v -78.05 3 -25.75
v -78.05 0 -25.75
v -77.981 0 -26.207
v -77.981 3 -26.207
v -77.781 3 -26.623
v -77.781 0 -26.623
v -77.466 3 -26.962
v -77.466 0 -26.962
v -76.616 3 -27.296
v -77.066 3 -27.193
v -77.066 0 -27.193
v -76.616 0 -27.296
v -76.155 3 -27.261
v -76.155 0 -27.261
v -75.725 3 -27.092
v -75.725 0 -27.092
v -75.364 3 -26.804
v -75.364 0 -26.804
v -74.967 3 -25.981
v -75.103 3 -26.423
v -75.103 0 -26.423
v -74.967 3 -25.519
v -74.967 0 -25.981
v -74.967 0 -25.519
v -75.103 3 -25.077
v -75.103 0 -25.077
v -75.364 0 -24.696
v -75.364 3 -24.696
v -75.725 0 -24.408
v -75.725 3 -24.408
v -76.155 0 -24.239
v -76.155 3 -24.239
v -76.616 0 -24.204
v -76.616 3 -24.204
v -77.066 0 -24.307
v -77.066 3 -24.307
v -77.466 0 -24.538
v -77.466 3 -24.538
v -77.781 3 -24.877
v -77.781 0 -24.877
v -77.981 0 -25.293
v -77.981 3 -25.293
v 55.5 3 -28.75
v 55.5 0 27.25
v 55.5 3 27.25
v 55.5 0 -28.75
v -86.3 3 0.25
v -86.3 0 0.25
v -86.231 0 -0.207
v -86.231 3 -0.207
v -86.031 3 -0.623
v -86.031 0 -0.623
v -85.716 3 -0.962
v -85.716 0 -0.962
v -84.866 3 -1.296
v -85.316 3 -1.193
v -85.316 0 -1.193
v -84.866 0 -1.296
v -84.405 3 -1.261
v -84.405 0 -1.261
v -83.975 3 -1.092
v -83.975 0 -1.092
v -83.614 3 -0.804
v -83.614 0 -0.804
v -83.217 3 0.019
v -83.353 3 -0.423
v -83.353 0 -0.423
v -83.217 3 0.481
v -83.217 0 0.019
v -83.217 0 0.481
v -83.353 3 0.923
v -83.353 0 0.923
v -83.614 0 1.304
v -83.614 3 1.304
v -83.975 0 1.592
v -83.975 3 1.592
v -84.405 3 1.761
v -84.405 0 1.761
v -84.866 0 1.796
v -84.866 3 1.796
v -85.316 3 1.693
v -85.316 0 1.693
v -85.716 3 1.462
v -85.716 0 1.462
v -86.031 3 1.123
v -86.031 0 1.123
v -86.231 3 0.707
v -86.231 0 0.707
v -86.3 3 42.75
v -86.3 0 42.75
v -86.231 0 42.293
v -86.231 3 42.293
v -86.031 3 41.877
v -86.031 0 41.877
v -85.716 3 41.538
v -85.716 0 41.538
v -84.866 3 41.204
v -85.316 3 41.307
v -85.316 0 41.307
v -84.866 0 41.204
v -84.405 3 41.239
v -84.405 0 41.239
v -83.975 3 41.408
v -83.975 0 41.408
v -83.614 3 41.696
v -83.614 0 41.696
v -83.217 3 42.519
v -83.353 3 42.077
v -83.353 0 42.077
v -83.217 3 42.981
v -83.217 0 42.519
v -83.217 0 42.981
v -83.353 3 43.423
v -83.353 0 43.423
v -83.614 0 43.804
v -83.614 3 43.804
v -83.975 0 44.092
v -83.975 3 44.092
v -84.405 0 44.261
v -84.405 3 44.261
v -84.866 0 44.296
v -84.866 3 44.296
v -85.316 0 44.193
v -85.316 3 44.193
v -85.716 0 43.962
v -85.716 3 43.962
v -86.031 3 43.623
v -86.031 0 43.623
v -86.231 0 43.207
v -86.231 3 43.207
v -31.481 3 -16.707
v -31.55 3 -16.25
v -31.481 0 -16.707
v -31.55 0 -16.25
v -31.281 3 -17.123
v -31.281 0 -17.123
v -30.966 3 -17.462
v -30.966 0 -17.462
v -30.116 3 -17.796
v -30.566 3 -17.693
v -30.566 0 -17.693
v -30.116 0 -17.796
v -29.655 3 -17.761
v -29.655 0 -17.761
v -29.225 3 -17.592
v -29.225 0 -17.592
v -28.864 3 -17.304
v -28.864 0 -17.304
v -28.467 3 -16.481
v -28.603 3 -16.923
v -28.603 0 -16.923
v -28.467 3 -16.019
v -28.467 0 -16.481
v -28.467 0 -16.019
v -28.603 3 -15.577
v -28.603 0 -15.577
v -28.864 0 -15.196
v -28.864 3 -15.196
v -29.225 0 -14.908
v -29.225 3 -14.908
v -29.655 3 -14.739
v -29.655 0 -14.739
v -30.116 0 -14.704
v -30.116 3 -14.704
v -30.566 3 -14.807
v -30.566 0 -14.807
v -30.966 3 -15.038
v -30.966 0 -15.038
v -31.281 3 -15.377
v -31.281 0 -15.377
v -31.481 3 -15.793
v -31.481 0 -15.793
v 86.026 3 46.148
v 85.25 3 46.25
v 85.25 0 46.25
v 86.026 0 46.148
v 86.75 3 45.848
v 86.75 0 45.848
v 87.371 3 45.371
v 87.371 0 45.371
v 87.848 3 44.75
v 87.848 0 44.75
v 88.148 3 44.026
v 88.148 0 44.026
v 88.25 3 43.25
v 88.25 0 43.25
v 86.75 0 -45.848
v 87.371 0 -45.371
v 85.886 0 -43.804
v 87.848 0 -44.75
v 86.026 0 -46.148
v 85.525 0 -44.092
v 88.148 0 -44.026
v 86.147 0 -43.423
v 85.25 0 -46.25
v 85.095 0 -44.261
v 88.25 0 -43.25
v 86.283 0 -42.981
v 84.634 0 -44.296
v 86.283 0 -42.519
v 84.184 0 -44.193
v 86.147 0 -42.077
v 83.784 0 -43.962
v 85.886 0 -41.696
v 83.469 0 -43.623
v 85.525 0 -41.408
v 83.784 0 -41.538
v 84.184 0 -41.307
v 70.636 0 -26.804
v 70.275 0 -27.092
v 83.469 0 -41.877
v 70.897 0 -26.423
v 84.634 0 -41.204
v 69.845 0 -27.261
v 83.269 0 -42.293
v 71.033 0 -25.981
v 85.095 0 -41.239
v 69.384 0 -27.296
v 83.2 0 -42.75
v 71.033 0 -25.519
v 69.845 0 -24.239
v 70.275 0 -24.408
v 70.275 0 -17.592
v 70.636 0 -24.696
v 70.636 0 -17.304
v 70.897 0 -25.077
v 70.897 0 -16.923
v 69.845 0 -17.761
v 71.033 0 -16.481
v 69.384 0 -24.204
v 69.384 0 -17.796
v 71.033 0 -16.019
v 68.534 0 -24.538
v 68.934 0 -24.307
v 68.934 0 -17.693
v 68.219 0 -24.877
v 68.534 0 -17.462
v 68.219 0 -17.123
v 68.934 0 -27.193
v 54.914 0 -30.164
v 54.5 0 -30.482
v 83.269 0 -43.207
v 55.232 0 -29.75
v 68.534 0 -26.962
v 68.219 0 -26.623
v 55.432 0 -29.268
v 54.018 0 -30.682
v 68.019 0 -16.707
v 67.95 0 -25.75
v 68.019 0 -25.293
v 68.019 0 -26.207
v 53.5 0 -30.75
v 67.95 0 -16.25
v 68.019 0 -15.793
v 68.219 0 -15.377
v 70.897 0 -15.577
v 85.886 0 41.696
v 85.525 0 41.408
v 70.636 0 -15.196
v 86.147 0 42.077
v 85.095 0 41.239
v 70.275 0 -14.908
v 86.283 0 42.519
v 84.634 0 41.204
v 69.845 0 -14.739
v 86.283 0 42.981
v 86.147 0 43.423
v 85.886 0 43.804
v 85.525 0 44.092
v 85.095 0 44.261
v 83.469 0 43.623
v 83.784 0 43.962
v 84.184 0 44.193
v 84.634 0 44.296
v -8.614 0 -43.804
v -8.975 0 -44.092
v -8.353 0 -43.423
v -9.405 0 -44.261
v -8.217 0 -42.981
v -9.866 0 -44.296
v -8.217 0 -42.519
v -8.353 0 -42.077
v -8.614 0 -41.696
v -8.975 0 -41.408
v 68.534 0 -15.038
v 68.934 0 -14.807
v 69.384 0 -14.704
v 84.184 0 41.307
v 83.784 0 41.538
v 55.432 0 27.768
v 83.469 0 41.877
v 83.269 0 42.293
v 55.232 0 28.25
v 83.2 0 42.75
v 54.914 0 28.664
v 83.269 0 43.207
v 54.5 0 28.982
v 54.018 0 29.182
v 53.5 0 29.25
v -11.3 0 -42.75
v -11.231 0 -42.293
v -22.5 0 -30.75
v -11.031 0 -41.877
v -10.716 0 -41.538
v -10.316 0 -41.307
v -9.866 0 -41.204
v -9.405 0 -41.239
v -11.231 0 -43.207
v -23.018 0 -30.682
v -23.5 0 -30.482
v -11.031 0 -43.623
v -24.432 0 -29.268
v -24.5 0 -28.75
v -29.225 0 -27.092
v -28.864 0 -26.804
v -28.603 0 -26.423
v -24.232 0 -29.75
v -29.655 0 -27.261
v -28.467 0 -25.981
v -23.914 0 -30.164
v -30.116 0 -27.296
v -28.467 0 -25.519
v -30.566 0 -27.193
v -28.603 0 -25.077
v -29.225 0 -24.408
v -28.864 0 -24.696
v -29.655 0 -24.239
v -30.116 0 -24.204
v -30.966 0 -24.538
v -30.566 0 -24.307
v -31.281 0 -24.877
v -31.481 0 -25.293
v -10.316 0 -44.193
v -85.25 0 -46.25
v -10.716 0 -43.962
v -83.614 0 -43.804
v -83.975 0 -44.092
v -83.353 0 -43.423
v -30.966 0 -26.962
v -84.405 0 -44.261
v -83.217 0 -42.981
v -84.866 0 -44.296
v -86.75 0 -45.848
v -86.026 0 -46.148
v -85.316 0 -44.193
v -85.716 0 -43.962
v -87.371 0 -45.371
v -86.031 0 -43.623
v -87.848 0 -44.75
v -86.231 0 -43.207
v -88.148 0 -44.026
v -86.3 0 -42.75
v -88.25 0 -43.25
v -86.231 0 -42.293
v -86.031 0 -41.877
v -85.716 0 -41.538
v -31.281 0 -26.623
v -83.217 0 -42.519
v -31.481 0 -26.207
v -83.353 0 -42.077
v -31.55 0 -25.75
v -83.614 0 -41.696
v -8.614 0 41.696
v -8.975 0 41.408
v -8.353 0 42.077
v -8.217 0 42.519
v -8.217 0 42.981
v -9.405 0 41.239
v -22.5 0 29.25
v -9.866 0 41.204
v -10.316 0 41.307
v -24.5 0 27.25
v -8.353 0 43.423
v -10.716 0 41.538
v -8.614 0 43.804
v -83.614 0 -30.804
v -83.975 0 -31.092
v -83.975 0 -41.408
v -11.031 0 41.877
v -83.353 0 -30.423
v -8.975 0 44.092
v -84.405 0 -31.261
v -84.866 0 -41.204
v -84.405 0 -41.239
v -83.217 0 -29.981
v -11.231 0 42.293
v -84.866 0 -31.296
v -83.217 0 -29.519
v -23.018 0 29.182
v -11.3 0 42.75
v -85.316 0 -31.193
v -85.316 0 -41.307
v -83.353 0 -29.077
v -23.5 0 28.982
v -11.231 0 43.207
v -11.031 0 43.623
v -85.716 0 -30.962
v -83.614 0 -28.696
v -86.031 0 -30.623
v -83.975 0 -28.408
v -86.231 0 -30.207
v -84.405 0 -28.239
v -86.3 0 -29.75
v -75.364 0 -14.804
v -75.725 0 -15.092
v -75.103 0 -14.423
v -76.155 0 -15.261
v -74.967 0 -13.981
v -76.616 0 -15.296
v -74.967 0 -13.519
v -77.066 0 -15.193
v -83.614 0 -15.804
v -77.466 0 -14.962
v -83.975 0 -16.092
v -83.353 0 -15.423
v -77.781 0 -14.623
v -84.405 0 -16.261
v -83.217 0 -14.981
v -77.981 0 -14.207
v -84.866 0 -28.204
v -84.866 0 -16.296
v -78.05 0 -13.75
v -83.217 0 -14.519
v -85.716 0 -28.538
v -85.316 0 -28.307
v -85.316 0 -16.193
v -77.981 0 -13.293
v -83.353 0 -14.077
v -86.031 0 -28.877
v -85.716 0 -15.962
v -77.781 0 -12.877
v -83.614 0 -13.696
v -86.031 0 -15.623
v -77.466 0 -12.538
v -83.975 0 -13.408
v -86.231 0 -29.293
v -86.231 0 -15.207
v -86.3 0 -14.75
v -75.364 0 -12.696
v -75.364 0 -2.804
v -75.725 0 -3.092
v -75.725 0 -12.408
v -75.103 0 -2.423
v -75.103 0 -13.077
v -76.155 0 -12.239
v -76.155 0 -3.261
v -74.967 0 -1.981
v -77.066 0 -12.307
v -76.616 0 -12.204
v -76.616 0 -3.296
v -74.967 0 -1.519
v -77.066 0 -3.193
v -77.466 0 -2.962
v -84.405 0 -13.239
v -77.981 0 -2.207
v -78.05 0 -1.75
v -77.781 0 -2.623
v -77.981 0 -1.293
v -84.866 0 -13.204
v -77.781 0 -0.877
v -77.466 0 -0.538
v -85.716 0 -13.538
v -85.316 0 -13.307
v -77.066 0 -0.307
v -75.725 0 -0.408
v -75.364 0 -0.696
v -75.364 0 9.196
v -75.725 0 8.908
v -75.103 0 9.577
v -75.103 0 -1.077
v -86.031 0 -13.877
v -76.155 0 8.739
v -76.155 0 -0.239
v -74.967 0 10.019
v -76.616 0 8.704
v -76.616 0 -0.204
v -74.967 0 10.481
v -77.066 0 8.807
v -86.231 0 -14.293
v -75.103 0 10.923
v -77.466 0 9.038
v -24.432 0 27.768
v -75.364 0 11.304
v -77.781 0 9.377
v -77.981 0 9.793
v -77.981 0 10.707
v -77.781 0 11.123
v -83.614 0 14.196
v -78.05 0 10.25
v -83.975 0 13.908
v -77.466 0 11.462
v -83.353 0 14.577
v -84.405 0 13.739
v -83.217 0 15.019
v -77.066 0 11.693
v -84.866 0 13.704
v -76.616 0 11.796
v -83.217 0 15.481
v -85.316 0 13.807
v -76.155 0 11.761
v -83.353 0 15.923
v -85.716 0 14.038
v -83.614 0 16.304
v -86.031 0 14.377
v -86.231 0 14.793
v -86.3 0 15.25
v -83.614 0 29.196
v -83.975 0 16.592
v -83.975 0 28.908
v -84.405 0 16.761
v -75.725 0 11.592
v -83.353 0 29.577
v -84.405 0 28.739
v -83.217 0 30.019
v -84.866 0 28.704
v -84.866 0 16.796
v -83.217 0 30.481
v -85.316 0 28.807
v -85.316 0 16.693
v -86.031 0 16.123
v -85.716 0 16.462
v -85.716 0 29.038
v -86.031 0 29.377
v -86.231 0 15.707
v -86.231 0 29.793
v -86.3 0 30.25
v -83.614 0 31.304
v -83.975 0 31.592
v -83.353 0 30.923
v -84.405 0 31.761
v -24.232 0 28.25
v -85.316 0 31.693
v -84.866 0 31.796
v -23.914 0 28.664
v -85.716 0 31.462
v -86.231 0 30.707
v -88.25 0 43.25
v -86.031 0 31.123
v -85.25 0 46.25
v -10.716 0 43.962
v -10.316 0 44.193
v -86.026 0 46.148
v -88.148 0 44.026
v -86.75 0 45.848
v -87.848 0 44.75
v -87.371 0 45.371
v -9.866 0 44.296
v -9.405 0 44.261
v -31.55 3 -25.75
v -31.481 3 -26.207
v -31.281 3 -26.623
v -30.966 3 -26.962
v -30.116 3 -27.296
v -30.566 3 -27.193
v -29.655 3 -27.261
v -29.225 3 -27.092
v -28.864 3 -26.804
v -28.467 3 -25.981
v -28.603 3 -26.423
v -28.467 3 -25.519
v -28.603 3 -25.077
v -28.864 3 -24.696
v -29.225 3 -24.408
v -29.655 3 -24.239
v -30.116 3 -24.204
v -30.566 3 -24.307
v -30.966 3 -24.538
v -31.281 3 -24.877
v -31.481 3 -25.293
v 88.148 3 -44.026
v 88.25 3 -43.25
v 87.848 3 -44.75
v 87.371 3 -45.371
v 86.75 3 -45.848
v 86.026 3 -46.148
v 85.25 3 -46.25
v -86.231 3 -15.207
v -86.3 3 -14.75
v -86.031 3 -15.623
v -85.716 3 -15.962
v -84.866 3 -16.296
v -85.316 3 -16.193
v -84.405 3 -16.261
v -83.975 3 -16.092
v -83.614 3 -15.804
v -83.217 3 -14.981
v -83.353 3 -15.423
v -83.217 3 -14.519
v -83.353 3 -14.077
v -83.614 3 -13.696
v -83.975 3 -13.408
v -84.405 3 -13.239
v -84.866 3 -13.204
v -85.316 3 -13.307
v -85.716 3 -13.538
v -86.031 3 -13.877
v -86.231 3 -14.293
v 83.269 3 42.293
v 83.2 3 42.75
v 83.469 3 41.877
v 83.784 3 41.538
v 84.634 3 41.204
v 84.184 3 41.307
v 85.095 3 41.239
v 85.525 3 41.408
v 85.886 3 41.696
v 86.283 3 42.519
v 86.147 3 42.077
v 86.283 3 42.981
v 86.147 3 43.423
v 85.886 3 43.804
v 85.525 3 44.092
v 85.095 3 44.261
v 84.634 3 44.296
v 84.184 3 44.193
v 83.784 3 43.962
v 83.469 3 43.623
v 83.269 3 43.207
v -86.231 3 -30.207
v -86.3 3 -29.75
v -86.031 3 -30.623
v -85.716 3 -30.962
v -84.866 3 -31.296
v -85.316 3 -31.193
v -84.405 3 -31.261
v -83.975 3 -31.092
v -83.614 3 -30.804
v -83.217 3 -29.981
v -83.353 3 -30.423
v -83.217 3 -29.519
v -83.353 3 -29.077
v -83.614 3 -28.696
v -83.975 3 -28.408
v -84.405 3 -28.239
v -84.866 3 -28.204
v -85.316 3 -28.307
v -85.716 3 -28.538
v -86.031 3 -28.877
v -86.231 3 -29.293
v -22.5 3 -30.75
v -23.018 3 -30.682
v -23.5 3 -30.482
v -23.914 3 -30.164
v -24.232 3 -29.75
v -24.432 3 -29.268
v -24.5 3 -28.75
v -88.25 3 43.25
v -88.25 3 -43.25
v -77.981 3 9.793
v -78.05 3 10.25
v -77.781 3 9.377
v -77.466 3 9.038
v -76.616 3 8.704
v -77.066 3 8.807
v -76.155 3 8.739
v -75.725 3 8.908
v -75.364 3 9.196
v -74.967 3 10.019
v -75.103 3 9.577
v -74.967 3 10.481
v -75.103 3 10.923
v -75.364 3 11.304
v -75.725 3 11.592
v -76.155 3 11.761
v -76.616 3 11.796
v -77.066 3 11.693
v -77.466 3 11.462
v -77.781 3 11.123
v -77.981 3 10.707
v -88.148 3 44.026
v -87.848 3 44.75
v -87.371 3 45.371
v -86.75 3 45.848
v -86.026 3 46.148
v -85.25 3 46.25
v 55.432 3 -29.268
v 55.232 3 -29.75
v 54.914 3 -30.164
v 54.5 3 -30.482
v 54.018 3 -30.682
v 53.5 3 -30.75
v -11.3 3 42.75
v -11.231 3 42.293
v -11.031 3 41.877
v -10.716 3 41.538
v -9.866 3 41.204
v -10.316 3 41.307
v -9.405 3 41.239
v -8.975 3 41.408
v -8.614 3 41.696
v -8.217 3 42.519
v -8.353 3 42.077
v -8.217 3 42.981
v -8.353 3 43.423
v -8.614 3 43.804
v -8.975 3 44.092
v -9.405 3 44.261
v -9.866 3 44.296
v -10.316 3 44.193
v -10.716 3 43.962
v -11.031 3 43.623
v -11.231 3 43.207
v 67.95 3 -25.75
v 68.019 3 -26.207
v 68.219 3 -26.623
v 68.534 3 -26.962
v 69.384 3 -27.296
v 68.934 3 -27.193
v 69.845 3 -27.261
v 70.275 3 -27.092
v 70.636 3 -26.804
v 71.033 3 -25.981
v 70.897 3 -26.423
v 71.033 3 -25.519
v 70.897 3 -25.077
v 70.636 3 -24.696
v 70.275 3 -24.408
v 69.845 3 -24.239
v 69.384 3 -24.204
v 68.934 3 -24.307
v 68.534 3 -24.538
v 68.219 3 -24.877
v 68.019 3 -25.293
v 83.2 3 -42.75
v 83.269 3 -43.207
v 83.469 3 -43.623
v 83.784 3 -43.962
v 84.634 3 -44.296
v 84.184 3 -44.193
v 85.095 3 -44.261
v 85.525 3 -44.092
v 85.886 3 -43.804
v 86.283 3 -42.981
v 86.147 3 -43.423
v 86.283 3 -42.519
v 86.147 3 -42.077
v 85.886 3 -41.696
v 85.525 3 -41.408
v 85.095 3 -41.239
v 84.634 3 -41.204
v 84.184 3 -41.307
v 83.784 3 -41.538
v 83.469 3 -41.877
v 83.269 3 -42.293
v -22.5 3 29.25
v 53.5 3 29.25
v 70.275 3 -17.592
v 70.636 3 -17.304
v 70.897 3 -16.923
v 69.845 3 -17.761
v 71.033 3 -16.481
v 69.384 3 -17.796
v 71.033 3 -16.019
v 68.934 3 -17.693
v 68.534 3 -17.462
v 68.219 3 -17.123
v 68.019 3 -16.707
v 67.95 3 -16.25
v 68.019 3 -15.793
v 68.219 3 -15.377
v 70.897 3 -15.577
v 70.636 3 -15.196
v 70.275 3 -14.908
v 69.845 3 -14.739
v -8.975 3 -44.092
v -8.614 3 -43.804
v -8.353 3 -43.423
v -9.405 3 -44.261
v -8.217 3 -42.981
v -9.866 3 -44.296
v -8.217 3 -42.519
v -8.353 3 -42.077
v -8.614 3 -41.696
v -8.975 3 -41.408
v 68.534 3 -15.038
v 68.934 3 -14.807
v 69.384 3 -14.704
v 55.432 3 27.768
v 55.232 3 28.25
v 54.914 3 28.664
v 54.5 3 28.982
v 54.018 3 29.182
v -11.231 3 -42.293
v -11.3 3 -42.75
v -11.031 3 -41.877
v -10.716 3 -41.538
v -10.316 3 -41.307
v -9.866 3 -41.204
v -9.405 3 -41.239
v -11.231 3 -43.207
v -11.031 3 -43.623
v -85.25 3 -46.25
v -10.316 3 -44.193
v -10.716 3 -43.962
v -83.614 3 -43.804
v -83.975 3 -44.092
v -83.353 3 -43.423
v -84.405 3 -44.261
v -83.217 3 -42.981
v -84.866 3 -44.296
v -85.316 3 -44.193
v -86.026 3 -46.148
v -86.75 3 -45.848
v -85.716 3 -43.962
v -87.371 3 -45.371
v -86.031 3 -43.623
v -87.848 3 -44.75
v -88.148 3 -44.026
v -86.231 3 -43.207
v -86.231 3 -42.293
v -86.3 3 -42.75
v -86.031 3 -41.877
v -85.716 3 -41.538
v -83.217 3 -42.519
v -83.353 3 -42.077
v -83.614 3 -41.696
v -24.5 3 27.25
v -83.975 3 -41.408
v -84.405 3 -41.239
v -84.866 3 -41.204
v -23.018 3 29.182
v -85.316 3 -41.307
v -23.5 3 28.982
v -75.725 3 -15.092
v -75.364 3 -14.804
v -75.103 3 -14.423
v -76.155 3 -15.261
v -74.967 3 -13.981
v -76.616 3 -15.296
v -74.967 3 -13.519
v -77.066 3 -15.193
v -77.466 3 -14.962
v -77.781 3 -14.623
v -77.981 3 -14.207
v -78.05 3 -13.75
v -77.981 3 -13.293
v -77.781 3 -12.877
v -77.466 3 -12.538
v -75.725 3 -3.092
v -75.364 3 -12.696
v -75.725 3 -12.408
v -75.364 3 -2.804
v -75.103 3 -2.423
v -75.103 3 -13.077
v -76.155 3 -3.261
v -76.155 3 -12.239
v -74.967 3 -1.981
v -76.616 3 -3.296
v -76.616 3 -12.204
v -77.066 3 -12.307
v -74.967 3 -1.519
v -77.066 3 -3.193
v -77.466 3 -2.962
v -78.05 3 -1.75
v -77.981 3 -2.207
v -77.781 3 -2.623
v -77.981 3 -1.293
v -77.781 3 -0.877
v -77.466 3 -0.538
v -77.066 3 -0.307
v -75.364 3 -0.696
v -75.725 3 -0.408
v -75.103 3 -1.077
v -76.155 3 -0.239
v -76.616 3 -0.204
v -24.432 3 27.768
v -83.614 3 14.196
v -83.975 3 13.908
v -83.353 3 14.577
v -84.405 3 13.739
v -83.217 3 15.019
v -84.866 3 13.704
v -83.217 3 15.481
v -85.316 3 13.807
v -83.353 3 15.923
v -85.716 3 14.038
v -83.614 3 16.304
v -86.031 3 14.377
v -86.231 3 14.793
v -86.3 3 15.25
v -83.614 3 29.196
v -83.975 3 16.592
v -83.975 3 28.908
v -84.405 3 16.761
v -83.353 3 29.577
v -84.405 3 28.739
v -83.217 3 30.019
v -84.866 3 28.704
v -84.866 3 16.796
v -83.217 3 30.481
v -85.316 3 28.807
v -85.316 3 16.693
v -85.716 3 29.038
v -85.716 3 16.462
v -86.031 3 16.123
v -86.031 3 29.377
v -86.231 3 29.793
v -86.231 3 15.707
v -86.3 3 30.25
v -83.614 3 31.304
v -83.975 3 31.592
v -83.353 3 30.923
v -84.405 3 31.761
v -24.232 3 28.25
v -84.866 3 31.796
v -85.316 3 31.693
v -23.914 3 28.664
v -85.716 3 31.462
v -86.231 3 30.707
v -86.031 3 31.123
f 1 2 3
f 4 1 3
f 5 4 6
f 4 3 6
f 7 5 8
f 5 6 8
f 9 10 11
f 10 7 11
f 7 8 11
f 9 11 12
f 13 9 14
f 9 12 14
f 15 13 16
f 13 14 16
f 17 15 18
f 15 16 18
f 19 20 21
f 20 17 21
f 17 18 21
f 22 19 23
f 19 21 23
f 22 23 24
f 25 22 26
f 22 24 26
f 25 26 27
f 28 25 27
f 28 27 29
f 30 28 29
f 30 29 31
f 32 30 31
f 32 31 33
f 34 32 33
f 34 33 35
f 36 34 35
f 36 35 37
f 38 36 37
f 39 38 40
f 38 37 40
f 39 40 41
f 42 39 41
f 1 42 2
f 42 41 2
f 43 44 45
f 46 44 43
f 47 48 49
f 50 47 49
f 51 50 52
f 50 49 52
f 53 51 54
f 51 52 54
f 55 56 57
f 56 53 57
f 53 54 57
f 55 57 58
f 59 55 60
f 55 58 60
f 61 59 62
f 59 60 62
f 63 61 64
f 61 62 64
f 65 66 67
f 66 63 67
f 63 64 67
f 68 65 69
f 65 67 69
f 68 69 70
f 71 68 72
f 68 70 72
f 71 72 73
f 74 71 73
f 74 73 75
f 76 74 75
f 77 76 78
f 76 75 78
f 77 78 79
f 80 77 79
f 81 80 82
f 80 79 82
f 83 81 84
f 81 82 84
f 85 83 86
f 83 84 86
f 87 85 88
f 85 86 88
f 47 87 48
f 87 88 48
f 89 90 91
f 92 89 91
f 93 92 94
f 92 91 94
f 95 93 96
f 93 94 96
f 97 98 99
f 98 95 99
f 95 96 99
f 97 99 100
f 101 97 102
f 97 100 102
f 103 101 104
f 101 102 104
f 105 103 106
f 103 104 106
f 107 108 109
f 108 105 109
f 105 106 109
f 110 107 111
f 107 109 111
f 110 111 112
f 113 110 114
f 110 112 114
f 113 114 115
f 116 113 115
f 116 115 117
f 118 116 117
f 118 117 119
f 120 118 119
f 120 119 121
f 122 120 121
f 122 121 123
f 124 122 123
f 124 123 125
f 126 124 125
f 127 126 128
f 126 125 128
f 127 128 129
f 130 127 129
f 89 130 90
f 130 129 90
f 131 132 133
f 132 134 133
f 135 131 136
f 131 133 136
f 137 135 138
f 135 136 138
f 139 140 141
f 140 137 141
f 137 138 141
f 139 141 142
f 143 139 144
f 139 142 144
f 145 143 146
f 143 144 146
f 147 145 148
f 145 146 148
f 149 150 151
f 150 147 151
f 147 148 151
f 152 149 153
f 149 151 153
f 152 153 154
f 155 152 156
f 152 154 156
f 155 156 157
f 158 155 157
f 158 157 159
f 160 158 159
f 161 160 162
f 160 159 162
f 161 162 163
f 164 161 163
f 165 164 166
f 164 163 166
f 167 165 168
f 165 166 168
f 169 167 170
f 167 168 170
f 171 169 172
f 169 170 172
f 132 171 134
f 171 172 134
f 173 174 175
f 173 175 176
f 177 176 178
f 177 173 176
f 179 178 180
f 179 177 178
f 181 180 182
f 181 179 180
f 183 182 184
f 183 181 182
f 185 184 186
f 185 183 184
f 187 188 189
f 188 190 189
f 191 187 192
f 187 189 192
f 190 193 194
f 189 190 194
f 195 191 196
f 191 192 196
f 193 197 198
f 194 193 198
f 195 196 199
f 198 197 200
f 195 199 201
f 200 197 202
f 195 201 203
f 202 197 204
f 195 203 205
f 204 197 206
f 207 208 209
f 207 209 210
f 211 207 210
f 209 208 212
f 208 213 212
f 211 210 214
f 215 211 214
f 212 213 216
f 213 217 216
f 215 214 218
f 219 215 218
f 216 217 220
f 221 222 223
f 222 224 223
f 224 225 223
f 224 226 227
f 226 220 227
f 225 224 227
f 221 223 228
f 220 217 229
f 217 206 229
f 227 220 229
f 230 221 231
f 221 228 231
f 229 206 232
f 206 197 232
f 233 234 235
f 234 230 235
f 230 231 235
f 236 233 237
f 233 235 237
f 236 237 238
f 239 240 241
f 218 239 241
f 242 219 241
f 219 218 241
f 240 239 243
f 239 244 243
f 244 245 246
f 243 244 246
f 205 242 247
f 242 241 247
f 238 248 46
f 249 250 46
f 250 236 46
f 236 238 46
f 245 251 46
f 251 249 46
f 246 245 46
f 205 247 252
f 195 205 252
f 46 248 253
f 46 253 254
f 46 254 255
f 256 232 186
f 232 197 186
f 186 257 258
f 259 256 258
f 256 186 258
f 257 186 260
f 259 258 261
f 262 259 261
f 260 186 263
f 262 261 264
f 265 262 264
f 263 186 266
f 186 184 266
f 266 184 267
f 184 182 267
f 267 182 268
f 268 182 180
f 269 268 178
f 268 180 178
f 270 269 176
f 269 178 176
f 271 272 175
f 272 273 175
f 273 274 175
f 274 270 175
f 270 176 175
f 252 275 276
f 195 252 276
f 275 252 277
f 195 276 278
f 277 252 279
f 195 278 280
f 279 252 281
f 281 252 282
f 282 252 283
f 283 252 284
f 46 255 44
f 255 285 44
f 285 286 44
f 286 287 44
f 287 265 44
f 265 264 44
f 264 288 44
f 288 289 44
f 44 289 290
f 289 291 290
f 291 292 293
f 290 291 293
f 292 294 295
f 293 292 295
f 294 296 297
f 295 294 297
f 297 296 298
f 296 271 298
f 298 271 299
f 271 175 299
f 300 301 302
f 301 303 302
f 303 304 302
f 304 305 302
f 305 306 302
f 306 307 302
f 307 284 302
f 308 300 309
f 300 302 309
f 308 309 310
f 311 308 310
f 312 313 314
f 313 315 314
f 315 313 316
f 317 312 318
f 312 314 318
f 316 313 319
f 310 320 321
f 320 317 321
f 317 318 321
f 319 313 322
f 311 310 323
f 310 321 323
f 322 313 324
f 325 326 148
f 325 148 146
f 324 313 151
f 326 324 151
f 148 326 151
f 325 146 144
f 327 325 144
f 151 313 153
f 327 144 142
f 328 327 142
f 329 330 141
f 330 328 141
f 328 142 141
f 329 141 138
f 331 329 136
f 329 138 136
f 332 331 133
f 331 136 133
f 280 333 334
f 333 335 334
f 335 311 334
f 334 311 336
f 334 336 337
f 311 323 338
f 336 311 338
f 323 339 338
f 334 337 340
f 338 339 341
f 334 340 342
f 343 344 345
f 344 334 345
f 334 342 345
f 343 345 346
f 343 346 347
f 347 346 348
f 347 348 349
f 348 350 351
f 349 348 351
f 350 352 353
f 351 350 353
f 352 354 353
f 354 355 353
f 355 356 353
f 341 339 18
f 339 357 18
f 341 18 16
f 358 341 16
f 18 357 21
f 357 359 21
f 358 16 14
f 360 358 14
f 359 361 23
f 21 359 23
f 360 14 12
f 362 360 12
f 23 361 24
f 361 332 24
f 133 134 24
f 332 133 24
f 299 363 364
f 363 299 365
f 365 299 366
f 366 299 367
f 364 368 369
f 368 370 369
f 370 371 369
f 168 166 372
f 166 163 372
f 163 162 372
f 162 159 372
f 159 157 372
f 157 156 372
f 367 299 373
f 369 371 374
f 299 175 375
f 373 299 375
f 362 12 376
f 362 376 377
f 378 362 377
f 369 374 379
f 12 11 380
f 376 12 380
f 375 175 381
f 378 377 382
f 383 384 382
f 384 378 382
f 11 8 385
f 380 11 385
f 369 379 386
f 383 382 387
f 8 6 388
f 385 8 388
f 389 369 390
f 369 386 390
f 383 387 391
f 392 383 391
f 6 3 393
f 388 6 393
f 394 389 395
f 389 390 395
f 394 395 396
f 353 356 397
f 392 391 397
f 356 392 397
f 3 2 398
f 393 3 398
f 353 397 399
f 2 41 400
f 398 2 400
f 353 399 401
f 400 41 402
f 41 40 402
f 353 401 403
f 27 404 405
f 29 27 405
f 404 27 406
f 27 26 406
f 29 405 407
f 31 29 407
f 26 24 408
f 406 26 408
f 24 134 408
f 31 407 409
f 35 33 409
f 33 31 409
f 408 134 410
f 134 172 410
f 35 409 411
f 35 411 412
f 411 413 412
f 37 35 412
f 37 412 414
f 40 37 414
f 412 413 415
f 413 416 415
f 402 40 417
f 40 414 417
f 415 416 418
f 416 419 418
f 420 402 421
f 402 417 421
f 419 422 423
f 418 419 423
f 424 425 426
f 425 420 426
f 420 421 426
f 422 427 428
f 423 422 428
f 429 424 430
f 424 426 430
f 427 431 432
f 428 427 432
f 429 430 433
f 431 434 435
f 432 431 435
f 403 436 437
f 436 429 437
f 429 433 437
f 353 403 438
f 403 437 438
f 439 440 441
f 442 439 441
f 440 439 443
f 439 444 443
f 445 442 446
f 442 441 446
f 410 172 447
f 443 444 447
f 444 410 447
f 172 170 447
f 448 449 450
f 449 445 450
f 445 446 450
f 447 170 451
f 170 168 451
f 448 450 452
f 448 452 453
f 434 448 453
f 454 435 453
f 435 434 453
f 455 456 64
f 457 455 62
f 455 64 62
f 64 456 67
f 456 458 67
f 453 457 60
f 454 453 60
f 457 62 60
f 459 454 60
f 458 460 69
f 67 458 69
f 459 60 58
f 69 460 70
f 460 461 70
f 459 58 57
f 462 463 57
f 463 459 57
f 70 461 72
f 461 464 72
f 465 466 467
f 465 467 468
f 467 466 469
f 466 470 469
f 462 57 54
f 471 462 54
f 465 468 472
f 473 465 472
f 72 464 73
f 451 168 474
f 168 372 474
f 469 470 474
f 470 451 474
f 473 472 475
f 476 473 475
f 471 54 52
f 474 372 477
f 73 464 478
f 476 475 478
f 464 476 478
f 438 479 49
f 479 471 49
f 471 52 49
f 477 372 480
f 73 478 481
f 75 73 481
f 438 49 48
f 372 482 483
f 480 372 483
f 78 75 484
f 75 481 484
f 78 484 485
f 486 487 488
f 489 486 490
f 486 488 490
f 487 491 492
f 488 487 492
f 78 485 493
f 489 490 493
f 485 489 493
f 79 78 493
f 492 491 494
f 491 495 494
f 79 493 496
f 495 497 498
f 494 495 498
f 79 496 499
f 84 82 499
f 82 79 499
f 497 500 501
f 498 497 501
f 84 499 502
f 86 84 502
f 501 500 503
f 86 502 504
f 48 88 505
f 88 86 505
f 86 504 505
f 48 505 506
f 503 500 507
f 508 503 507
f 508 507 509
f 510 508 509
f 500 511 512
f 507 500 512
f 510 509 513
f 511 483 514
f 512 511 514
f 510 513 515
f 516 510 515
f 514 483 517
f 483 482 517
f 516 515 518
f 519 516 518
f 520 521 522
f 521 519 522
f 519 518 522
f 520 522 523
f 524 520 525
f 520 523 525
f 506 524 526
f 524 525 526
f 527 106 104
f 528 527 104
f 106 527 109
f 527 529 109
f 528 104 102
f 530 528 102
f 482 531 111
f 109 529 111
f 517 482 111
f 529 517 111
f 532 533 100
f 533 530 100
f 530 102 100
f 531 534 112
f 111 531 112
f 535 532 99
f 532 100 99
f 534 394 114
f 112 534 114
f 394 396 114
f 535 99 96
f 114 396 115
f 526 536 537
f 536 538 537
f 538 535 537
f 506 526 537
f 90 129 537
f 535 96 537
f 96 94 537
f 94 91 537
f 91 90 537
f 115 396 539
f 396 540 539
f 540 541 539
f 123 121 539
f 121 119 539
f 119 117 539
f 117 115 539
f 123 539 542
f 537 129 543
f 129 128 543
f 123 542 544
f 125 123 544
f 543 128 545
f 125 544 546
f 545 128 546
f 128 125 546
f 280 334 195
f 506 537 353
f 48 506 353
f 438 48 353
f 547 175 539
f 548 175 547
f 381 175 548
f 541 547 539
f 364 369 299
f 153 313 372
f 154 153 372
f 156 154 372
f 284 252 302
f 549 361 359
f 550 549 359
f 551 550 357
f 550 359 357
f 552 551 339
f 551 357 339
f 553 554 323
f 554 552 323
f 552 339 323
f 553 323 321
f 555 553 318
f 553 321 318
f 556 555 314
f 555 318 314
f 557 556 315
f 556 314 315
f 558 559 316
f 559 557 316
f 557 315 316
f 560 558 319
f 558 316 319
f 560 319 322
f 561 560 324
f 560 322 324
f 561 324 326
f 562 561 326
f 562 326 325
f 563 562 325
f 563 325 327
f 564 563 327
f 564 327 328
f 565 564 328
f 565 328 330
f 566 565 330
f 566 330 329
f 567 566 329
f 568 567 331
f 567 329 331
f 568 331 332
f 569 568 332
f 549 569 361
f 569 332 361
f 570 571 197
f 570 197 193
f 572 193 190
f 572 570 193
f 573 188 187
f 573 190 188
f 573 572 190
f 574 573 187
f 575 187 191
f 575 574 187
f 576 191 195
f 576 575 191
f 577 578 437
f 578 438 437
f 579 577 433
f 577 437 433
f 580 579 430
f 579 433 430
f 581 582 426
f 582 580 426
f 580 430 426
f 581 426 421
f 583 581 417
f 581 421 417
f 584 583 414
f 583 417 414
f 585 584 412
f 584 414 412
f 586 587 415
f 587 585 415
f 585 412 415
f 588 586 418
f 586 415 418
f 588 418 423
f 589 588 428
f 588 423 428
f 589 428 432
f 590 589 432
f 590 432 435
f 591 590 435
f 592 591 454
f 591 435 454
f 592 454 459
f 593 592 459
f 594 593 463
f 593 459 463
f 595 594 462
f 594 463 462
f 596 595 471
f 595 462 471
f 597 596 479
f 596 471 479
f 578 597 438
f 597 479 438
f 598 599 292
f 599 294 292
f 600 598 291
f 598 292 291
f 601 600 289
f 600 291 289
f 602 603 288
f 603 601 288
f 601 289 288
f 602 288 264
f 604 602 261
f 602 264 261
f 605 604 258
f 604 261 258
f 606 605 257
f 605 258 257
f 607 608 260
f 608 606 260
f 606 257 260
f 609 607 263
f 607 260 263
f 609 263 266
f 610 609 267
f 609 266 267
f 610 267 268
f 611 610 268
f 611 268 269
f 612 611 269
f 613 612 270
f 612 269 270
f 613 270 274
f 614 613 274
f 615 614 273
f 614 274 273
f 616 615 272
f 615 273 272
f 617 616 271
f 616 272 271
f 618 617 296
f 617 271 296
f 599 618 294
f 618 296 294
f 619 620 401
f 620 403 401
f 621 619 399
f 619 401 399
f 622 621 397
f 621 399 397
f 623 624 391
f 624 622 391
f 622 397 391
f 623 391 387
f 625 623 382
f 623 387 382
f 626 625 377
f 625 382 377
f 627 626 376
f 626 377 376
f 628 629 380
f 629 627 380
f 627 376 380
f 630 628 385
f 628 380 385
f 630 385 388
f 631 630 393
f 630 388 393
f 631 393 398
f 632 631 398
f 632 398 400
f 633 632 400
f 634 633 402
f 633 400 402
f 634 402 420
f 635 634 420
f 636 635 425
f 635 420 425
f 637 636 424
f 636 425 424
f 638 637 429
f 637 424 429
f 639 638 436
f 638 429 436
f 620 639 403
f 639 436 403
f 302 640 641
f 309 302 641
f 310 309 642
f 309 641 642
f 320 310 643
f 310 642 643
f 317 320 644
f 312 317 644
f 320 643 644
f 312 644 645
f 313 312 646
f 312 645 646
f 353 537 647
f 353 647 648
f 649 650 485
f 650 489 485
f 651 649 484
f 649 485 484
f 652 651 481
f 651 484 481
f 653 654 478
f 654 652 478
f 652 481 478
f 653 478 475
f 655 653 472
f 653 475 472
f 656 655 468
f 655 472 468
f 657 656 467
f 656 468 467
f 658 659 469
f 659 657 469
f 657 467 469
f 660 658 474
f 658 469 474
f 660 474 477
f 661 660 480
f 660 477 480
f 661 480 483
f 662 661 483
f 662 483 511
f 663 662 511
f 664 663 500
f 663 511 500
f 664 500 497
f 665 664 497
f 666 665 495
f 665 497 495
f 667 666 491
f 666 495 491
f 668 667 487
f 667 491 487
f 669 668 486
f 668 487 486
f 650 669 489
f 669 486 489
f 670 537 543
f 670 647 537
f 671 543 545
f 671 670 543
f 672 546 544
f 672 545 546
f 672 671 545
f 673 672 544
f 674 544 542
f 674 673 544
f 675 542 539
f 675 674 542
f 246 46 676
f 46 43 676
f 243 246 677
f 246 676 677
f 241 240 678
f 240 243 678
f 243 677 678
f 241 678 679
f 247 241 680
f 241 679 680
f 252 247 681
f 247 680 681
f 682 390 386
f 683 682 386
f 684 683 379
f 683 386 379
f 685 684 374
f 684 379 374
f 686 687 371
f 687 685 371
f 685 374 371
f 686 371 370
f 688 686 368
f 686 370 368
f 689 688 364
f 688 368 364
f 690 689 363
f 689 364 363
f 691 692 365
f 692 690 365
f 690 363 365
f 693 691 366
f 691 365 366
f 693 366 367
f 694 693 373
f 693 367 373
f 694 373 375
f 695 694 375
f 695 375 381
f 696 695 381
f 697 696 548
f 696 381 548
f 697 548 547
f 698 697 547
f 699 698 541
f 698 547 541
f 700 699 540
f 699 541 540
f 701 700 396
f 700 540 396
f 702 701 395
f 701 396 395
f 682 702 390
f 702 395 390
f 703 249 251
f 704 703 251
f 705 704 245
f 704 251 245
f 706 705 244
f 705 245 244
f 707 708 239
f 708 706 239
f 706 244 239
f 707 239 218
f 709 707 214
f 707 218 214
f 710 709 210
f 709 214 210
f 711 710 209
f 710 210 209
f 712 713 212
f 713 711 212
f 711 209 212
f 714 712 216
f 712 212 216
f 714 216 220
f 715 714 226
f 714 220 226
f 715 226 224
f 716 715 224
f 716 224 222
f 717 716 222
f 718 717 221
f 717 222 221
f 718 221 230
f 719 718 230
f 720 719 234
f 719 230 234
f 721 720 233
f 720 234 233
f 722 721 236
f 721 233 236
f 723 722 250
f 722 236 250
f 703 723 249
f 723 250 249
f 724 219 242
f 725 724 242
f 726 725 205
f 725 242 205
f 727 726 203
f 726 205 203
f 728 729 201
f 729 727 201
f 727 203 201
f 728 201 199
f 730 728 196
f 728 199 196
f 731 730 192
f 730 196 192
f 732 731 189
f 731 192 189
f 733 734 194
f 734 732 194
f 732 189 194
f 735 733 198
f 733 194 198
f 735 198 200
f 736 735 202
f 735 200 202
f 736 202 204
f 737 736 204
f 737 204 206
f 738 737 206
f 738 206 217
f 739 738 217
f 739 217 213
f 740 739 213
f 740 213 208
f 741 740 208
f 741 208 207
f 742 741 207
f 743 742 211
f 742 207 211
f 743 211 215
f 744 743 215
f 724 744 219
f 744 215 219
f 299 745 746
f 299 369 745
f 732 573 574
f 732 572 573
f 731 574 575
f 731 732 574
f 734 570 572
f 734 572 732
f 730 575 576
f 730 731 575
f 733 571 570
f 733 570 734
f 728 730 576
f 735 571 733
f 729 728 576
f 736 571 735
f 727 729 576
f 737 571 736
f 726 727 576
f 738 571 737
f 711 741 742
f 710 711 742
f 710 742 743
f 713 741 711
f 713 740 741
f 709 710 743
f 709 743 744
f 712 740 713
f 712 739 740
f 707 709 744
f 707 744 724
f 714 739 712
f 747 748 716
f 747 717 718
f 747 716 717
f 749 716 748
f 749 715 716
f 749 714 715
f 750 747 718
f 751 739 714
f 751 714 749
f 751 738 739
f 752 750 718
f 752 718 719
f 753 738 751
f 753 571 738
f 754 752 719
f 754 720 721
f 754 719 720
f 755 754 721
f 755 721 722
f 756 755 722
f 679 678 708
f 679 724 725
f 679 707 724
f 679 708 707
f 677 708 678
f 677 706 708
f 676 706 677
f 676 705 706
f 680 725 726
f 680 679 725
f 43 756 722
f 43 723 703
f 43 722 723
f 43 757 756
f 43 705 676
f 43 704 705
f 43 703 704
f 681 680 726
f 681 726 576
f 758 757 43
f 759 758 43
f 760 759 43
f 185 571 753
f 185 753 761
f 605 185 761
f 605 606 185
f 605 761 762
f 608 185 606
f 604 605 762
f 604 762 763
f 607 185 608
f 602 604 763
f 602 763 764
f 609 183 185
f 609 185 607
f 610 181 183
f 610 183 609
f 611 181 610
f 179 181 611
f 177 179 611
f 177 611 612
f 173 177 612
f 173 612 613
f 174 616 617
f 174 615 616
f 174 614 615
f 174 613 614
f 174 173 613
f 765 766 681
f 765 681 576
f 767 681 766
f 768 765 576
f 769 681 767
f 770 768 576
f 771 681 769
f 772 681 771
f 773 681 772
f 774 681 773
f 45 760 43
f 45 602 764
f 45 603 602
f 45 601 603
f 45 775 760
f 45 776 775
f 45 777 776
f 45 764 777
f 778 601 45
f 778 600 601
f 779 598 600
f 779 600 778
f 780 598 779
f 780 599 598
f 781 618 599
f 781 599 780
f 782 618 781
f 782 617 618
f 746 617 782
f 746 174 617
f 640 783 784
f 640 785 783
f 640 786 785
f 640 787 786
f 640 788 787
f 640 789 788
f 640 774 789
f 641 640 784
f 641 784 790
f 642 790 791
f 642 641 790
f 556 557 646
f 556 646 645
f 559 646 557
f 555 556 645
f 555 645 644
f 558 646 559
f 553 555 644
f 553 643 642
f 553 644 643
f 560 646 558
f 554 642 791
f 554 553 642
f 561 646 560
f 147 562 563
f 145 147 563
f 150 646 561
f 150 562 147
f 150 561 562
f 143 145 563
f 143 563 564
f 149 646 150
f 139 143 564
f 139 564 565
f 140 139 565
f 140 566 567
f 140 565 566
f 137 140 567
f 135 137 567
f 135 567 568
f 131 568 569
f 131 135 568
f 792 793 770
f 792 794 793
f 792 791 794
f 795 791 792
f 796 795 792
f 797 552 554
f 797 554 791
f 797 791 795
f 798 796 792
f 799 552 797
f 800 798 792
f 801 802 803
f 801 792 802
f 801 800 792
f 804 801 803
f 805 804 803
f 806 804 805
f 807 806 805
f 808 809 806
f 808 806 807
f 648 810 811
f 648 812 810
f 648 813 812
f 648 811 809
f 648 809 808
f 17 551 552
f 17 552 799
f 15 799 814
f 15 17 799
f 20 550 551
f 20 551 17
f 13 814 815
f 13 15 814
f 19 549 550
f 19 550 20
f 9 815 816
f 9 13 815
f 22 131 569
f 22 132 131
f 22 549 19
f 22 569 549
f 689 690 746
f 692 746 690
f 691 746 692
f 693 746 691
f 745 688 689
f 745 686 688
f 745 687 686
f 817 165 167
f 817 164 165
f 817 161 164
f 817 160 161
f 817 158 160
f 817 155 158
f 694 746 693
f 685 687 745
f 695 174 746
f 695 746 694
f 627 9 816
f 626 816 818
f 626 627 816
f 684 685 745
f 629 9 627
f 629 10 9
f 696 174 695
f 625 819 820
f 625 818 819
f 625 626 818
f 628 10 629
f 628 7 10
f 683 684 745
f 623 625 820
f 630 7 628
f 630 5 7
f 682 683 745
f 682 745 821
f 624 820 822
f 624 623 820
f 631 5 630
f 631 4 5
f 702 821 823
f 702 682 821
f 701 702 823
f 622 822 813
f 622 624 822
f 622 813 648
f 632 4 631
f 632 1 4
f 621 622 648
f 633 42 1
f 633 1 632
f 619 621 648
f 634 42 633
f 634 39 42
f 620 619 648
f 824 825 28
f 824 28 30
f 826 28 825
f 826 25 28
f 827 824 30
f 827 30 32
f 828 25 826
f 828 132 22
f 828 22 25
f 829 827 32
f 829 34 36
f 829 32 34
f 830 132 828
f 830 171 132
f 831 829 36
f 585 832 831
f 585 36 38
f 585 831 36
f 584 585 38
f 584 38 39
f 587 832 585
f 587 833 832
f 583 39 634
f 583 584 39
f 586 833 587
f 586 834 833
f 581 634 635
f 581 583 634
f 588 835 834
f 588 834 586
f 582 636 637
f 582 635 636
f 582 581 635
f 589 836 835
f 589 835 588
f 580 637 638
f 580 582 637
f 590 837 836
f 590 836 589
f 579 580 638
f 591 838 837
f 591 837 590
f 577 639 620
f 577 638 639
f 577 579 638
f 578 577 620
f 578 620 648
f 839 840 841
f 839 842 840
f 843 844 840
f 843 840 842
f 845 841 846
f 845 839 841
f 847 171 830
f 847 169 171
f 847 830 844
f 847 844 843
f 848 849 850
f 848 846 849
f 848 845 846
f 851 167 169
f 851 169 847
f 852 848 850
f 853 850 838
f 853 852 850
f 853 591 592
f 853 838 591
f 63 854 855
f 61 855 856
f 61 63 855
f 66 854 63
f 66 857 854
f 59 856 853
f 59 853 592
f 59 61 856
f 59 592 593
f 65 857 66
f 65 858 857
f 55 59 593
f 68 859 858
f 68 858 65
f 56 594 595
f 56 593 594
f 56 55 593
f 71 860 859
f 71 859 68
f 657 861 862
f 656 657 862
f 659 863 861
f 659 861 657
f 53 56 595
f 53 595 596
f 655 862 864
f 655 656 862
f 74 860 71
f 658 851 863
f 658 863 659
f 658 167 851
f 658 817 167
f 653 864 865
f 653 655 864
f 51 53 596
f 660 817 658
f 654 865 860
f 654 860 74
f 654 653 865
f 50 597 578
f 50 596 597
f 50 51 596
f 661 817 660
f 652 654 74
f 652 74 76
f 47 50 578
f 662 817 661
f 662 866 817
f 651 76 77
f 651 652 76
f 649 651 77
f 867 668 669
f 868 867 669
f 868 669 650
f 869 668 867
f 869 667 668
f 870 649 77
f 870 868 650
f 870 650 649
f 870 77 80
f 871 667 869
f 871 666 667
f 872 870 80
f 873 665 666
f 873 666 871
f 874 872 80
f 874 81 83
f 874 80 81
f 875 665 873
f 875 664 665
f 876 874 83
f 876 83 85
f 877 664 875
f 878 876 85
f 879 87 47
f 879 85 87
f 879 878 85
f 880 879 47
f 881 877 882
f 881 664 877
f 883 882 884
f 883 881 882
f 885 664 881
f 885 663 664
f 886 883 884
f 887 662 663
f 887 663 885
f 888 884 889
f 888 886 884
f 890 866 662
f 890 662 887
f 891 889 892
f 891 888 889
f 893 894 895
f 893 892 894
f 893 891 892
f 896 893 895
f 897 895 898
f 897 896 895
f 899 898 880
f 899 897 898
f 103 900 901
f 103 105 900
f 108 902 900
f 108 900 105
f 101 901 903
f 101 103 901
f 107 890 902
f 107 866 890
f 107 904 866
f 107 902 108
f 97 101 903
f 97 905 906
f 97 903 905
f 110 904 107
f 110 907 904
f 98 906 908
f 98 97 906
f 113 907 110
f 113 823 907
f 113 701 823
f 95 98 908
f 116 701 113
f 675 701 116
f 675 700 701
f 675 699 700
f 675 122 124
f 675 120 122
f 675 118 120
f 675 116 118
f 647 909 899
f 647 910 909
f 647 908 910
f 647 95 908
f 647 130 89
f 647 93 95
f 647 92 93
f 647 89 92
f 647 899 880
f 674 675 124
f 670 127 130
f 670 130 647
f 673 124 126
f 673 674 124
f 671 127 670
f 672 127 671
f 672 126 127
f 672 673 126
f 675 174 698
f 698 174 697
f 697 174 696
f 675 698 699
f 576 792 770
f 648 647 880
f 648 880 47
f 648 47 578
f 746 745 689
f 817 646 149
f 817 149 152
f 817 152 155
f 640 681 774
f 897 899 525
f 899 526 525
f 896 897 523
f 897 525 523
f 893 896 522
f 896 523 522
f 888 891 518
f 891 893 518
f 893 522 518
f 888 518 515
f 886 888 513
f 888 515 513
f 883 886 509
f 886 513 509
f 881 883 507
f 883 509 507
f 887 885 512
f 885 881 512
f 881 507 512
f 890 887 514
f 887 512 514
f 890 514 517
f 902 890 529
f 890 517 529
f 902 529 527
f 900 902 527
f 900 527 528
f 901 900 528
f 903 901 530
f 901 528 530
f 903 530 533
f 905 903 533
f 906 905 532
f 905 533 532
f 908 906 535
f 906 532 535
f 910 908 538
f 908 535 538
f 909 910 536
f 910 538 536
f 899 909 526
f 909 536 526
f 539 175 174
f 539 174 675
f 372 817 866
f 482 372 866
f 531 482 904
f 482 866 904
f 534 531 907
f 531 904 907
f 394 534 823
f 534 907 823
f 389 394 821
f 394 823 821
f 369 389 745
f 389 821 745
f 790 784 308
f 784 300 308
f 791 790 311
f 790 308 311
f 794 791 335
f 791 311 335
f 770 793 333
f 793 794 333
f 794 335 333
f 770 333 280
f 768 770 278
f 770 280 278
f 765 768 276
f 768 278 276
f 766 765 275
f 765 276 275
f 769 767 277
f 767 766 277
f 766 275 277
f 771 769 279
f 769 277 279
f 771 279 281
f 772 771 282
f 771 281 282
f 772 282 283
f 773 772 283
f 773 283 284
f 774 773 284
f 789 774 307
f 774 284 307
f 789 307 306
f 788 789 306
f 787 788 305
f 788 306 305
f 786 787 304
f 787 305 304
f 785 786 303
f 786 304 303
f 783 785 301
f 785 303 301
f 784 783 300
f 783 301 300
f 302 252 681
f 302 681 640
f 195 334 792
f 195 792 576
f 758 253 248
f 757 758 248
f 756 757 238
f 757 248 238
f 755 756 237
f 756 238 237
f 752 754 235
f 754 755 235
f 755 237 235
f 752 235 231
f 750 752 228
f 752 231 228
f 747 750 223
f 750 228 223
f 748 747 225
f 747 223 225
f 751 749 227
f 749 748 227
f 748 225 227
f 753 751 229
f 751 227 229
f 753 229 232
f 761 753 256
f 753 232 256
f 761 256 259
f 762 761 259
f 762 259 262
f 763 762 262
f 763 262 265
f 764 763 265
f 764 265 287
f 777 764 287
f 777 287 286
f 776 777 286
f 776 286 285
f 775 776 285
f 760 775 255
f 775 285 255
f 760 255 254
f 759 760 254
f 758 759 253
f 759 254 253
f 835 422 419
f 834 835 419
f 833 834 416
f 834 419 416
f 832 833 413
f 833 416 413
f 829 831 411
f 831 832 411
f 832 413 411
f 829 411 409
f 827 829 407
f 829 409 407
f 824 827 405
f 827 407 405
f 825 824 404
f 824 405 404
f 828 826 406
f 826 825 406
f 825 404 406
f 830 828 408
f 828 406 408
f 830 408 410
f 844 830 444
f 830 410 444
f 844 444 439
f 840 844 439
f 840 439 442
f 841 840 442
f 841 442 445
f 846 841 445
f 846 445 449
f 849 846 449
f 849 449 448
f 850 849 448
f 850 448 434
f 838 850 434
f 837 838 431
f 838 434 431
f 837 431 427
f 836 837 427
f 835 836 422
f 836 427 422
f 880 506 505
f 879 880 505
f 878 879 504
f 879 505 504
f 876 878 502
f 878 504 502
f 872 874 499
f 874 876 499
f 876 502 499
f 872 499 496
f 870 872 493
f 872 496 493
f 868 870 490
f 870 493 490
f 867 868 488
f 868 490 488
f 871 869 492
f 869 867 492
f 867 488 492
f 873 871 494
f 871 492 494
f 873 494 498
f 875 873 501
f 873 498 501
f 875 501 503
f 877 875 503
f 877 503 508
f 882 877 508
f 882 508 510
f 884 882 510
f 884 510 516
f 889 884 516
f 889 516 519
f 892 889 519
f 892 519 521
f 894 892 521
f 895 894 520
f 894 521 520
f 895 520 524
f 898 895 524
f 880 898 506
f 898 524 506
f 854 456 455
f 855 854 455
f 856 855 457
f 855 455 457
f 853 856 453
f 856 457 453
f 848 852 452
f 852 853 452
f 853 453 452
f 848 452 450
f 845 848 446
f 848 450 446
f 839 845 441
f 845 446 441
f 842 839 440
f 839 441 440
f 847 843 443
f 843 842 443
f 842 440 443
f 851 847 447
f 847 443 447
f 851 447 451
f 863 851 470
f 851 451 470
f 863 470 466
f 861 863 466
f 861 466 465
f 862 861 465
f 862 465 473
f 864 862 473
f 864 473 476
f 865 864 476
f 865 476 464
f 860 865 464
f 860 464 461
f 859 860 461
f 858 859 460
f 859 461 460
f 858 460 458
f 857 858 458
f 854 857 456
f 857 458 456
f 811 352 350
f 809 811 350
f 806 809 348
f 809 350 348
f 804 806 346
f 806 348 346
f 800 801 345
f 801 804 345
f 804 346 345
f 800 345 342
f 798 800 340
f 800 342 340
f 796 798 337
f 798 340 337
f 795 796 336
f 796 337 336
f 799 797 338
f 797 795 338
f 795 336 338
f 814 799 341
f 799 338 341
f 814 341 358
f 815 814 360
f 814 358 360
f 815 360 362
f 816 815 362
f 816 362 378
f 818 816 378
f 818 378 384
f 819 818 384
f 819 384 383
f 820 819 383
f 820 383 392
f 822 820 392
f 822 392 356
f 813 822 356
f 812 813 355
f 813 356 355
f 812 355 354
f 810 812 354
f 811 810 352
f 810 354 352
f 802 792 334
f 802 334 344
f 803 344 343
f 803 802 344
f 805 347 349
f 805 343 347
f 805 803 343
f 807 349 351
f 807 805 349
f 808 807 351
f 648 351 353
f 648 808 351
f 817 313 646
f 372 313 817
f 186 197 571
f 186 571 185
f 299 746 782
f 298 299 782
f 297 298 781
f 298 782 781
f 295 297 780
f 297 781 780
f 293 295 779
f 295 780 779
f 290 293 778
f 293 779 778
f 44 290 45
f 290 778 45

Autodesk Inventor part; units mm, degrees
ref_plane "YZ Plane" through (0, 0, 0) normal (1, 0, 0) x (0, 1, 0)
ref_plane "XZ Plane" through (0, 0, 0) normal (0, 1, 0) x (-1, 0, 0)
ref_plane "XY Plane" through (0, 0, 0) normal (0, 0, 1) x (1, 0, 0)
sketch "スケッチ1" plane through (0, 0, 0) normal (0, 1, 0) x (-1, 0, 0)
  line L0 (-88.25, 46.25) -> (88.25, 46.25)
  line L1 (88.25, 46.25) -> (88.25, -46.25)
  line L2 (88.25, -46.25) -> (-88.25, -46.25)
  line L3 (-88.25, -46.25) -> (-88.25, 46.25)
  line L4 (-88.25, 46.25) -> (88.25, -46.25) construction
  line L5 (88.25, 46.25) -> (-88.25, -46.25) construction
  circle A0 centre (84.75, 42.75) radius 1.55
  circle A1 centre (9.75, 42.75) radius 1.55
  circle A2 centre (-84.75, 42.75) radius 1.55
  line L6 (151.0272, 0) -> (-157.6431, 0) construction
  line L7 (0, 129.3763) -> (0, -94.6315) construction
  circle A3 centre (84.75, -42.75) radius 1.55
  circle A4 centre (9.75, -42.75) radius 1.55
  circle A5 centre (-84.75, -42.75) radius 1.55
  circle A6 centre (30, -25.75) radius 1.55
  circle A7 centre (30, -16.25) radius 1.55
  line L8 (88.25, -25.75) -> (-88.25, -25.75) construction
  line L9 (-88.25, -16.25) -> (88.25, -16.25) construction
  circle A8 centre (-69.5, -25.75) radius 1.55
  circle A9 centre (-69.5, -16.25) radius 1.55
  circle A10 centre (84.75, -29.75) radius 1.55
  circle A11 centre (84.75, -14.75) radius 1.55
  circle A12 centre (84.75, 0.25) radius 1.55
  circle A13 centre (84.75, 15.25) radius 1.55
  circle A14 centre (84.75, 30.25) radius 1.55
  circle A15 centre (76.5, -25.75) radius 1.55
  circle A16 centre (76.5, -13.75) radius 1.55
  circle A17 centre (76.5, -1.75) radius 1.55
  circle A18 centre (76.5, 10.25) radius 1.55
  line L10 (-55.5, -30.75) -> (24.5, -30.75)
  line L11 (24.5, -30.75) -> (24.5, 29.25)
  line L12 (24.5, 29.25) -> (-55.5, 29.25)
  line L13 (-55.5, 29.25) -> (-55.5, -30.75)
  line L14 (-55.5, -30.75) -> (24.5, 29.25) construction
  line L15 (24.5, -30.75) -> (-55.5, 29.25) construction
  point P0 (0, 0)
  point P1 (-15.5, -0.75)
  dimension "d105" = 176.5
  dimension "d106" = 92.5
  dimension "d107" = 3.5
  dimension "d108" = 3.5
  dimension "d109" = 3.1
  dimension "d110" = 78.5
  dimension "d111" = 3.5
  dimension "d112" = 3.1
  dimension "d113" = 173
  dimension "d114" = 3.5
  dimension "d115" = 3.1
  dimension "d116" = 46.25
  dimension "d117" = 88.25
  dimension "d118" = 58.25
  dimension "d119" = 20.5
  dimension "d120" = 30
  dimension "d121" = 3.1
  dimension "d122" = 3.1
  dimension "d123" = 58.25
  dimension "d129" = 3.1
  dimension "d130" = 3.1
  dimension "d132" = 9.5
  dimension "d133" = 20.5
  dimension "d134" = 30
  dimension "d136" = 16.5
  dimension "d137" = 3.5
  dimension "d138" = 3.1
  dimension "d141" = 15
  dimension "d146" = 20.5
  dimension "d147" = 11.75
  dimension "d148" = 3.1
  dimension "d151" = 12
  dimension "d156" = 15.5
  dimension "d157" = 75.5
  dimension "d158" = 63.75
  dimension "d159" = 143.75
  dimension "d164" = 99.5
  dimension "d165" = 157.75
extrude "押し出し1" add sketch "スケッチ1" along normal blind 3
fillet "フィレット1" radius 2 4 edges at (-24.5, 1.5, 29.25) (-24.5, 1.5, -30.75) (55.5, 1.5, 29.25) (55.5, 1.5, -30.75)
fillet "フィレット2" radius 3 4 edges at (-88.25, 1.5, 46.25) (-88.25, 1.5, -46.25) (88.25, 1.5, 46.25) (88.25, 1.5, -46.25)
equation "\"d108\" = d107"
equation "\"d111\" = d107"
equation "\"d112\" = d109"
equation "\"d114\" = d111"
equation "\"d115\" = d112"
equation "\"d121\" = d109"
equation "\"d122\" = d109"
equation "\"d123\" = d118"
equation "\"d129\" = d131"
equation "\"d130\" = d131"
equation "\"d138\" = d109"
equation "\"d148\" = d138"
equation "\"d131\" = 3.1"
properties part number "Sole" material "GFRC"
